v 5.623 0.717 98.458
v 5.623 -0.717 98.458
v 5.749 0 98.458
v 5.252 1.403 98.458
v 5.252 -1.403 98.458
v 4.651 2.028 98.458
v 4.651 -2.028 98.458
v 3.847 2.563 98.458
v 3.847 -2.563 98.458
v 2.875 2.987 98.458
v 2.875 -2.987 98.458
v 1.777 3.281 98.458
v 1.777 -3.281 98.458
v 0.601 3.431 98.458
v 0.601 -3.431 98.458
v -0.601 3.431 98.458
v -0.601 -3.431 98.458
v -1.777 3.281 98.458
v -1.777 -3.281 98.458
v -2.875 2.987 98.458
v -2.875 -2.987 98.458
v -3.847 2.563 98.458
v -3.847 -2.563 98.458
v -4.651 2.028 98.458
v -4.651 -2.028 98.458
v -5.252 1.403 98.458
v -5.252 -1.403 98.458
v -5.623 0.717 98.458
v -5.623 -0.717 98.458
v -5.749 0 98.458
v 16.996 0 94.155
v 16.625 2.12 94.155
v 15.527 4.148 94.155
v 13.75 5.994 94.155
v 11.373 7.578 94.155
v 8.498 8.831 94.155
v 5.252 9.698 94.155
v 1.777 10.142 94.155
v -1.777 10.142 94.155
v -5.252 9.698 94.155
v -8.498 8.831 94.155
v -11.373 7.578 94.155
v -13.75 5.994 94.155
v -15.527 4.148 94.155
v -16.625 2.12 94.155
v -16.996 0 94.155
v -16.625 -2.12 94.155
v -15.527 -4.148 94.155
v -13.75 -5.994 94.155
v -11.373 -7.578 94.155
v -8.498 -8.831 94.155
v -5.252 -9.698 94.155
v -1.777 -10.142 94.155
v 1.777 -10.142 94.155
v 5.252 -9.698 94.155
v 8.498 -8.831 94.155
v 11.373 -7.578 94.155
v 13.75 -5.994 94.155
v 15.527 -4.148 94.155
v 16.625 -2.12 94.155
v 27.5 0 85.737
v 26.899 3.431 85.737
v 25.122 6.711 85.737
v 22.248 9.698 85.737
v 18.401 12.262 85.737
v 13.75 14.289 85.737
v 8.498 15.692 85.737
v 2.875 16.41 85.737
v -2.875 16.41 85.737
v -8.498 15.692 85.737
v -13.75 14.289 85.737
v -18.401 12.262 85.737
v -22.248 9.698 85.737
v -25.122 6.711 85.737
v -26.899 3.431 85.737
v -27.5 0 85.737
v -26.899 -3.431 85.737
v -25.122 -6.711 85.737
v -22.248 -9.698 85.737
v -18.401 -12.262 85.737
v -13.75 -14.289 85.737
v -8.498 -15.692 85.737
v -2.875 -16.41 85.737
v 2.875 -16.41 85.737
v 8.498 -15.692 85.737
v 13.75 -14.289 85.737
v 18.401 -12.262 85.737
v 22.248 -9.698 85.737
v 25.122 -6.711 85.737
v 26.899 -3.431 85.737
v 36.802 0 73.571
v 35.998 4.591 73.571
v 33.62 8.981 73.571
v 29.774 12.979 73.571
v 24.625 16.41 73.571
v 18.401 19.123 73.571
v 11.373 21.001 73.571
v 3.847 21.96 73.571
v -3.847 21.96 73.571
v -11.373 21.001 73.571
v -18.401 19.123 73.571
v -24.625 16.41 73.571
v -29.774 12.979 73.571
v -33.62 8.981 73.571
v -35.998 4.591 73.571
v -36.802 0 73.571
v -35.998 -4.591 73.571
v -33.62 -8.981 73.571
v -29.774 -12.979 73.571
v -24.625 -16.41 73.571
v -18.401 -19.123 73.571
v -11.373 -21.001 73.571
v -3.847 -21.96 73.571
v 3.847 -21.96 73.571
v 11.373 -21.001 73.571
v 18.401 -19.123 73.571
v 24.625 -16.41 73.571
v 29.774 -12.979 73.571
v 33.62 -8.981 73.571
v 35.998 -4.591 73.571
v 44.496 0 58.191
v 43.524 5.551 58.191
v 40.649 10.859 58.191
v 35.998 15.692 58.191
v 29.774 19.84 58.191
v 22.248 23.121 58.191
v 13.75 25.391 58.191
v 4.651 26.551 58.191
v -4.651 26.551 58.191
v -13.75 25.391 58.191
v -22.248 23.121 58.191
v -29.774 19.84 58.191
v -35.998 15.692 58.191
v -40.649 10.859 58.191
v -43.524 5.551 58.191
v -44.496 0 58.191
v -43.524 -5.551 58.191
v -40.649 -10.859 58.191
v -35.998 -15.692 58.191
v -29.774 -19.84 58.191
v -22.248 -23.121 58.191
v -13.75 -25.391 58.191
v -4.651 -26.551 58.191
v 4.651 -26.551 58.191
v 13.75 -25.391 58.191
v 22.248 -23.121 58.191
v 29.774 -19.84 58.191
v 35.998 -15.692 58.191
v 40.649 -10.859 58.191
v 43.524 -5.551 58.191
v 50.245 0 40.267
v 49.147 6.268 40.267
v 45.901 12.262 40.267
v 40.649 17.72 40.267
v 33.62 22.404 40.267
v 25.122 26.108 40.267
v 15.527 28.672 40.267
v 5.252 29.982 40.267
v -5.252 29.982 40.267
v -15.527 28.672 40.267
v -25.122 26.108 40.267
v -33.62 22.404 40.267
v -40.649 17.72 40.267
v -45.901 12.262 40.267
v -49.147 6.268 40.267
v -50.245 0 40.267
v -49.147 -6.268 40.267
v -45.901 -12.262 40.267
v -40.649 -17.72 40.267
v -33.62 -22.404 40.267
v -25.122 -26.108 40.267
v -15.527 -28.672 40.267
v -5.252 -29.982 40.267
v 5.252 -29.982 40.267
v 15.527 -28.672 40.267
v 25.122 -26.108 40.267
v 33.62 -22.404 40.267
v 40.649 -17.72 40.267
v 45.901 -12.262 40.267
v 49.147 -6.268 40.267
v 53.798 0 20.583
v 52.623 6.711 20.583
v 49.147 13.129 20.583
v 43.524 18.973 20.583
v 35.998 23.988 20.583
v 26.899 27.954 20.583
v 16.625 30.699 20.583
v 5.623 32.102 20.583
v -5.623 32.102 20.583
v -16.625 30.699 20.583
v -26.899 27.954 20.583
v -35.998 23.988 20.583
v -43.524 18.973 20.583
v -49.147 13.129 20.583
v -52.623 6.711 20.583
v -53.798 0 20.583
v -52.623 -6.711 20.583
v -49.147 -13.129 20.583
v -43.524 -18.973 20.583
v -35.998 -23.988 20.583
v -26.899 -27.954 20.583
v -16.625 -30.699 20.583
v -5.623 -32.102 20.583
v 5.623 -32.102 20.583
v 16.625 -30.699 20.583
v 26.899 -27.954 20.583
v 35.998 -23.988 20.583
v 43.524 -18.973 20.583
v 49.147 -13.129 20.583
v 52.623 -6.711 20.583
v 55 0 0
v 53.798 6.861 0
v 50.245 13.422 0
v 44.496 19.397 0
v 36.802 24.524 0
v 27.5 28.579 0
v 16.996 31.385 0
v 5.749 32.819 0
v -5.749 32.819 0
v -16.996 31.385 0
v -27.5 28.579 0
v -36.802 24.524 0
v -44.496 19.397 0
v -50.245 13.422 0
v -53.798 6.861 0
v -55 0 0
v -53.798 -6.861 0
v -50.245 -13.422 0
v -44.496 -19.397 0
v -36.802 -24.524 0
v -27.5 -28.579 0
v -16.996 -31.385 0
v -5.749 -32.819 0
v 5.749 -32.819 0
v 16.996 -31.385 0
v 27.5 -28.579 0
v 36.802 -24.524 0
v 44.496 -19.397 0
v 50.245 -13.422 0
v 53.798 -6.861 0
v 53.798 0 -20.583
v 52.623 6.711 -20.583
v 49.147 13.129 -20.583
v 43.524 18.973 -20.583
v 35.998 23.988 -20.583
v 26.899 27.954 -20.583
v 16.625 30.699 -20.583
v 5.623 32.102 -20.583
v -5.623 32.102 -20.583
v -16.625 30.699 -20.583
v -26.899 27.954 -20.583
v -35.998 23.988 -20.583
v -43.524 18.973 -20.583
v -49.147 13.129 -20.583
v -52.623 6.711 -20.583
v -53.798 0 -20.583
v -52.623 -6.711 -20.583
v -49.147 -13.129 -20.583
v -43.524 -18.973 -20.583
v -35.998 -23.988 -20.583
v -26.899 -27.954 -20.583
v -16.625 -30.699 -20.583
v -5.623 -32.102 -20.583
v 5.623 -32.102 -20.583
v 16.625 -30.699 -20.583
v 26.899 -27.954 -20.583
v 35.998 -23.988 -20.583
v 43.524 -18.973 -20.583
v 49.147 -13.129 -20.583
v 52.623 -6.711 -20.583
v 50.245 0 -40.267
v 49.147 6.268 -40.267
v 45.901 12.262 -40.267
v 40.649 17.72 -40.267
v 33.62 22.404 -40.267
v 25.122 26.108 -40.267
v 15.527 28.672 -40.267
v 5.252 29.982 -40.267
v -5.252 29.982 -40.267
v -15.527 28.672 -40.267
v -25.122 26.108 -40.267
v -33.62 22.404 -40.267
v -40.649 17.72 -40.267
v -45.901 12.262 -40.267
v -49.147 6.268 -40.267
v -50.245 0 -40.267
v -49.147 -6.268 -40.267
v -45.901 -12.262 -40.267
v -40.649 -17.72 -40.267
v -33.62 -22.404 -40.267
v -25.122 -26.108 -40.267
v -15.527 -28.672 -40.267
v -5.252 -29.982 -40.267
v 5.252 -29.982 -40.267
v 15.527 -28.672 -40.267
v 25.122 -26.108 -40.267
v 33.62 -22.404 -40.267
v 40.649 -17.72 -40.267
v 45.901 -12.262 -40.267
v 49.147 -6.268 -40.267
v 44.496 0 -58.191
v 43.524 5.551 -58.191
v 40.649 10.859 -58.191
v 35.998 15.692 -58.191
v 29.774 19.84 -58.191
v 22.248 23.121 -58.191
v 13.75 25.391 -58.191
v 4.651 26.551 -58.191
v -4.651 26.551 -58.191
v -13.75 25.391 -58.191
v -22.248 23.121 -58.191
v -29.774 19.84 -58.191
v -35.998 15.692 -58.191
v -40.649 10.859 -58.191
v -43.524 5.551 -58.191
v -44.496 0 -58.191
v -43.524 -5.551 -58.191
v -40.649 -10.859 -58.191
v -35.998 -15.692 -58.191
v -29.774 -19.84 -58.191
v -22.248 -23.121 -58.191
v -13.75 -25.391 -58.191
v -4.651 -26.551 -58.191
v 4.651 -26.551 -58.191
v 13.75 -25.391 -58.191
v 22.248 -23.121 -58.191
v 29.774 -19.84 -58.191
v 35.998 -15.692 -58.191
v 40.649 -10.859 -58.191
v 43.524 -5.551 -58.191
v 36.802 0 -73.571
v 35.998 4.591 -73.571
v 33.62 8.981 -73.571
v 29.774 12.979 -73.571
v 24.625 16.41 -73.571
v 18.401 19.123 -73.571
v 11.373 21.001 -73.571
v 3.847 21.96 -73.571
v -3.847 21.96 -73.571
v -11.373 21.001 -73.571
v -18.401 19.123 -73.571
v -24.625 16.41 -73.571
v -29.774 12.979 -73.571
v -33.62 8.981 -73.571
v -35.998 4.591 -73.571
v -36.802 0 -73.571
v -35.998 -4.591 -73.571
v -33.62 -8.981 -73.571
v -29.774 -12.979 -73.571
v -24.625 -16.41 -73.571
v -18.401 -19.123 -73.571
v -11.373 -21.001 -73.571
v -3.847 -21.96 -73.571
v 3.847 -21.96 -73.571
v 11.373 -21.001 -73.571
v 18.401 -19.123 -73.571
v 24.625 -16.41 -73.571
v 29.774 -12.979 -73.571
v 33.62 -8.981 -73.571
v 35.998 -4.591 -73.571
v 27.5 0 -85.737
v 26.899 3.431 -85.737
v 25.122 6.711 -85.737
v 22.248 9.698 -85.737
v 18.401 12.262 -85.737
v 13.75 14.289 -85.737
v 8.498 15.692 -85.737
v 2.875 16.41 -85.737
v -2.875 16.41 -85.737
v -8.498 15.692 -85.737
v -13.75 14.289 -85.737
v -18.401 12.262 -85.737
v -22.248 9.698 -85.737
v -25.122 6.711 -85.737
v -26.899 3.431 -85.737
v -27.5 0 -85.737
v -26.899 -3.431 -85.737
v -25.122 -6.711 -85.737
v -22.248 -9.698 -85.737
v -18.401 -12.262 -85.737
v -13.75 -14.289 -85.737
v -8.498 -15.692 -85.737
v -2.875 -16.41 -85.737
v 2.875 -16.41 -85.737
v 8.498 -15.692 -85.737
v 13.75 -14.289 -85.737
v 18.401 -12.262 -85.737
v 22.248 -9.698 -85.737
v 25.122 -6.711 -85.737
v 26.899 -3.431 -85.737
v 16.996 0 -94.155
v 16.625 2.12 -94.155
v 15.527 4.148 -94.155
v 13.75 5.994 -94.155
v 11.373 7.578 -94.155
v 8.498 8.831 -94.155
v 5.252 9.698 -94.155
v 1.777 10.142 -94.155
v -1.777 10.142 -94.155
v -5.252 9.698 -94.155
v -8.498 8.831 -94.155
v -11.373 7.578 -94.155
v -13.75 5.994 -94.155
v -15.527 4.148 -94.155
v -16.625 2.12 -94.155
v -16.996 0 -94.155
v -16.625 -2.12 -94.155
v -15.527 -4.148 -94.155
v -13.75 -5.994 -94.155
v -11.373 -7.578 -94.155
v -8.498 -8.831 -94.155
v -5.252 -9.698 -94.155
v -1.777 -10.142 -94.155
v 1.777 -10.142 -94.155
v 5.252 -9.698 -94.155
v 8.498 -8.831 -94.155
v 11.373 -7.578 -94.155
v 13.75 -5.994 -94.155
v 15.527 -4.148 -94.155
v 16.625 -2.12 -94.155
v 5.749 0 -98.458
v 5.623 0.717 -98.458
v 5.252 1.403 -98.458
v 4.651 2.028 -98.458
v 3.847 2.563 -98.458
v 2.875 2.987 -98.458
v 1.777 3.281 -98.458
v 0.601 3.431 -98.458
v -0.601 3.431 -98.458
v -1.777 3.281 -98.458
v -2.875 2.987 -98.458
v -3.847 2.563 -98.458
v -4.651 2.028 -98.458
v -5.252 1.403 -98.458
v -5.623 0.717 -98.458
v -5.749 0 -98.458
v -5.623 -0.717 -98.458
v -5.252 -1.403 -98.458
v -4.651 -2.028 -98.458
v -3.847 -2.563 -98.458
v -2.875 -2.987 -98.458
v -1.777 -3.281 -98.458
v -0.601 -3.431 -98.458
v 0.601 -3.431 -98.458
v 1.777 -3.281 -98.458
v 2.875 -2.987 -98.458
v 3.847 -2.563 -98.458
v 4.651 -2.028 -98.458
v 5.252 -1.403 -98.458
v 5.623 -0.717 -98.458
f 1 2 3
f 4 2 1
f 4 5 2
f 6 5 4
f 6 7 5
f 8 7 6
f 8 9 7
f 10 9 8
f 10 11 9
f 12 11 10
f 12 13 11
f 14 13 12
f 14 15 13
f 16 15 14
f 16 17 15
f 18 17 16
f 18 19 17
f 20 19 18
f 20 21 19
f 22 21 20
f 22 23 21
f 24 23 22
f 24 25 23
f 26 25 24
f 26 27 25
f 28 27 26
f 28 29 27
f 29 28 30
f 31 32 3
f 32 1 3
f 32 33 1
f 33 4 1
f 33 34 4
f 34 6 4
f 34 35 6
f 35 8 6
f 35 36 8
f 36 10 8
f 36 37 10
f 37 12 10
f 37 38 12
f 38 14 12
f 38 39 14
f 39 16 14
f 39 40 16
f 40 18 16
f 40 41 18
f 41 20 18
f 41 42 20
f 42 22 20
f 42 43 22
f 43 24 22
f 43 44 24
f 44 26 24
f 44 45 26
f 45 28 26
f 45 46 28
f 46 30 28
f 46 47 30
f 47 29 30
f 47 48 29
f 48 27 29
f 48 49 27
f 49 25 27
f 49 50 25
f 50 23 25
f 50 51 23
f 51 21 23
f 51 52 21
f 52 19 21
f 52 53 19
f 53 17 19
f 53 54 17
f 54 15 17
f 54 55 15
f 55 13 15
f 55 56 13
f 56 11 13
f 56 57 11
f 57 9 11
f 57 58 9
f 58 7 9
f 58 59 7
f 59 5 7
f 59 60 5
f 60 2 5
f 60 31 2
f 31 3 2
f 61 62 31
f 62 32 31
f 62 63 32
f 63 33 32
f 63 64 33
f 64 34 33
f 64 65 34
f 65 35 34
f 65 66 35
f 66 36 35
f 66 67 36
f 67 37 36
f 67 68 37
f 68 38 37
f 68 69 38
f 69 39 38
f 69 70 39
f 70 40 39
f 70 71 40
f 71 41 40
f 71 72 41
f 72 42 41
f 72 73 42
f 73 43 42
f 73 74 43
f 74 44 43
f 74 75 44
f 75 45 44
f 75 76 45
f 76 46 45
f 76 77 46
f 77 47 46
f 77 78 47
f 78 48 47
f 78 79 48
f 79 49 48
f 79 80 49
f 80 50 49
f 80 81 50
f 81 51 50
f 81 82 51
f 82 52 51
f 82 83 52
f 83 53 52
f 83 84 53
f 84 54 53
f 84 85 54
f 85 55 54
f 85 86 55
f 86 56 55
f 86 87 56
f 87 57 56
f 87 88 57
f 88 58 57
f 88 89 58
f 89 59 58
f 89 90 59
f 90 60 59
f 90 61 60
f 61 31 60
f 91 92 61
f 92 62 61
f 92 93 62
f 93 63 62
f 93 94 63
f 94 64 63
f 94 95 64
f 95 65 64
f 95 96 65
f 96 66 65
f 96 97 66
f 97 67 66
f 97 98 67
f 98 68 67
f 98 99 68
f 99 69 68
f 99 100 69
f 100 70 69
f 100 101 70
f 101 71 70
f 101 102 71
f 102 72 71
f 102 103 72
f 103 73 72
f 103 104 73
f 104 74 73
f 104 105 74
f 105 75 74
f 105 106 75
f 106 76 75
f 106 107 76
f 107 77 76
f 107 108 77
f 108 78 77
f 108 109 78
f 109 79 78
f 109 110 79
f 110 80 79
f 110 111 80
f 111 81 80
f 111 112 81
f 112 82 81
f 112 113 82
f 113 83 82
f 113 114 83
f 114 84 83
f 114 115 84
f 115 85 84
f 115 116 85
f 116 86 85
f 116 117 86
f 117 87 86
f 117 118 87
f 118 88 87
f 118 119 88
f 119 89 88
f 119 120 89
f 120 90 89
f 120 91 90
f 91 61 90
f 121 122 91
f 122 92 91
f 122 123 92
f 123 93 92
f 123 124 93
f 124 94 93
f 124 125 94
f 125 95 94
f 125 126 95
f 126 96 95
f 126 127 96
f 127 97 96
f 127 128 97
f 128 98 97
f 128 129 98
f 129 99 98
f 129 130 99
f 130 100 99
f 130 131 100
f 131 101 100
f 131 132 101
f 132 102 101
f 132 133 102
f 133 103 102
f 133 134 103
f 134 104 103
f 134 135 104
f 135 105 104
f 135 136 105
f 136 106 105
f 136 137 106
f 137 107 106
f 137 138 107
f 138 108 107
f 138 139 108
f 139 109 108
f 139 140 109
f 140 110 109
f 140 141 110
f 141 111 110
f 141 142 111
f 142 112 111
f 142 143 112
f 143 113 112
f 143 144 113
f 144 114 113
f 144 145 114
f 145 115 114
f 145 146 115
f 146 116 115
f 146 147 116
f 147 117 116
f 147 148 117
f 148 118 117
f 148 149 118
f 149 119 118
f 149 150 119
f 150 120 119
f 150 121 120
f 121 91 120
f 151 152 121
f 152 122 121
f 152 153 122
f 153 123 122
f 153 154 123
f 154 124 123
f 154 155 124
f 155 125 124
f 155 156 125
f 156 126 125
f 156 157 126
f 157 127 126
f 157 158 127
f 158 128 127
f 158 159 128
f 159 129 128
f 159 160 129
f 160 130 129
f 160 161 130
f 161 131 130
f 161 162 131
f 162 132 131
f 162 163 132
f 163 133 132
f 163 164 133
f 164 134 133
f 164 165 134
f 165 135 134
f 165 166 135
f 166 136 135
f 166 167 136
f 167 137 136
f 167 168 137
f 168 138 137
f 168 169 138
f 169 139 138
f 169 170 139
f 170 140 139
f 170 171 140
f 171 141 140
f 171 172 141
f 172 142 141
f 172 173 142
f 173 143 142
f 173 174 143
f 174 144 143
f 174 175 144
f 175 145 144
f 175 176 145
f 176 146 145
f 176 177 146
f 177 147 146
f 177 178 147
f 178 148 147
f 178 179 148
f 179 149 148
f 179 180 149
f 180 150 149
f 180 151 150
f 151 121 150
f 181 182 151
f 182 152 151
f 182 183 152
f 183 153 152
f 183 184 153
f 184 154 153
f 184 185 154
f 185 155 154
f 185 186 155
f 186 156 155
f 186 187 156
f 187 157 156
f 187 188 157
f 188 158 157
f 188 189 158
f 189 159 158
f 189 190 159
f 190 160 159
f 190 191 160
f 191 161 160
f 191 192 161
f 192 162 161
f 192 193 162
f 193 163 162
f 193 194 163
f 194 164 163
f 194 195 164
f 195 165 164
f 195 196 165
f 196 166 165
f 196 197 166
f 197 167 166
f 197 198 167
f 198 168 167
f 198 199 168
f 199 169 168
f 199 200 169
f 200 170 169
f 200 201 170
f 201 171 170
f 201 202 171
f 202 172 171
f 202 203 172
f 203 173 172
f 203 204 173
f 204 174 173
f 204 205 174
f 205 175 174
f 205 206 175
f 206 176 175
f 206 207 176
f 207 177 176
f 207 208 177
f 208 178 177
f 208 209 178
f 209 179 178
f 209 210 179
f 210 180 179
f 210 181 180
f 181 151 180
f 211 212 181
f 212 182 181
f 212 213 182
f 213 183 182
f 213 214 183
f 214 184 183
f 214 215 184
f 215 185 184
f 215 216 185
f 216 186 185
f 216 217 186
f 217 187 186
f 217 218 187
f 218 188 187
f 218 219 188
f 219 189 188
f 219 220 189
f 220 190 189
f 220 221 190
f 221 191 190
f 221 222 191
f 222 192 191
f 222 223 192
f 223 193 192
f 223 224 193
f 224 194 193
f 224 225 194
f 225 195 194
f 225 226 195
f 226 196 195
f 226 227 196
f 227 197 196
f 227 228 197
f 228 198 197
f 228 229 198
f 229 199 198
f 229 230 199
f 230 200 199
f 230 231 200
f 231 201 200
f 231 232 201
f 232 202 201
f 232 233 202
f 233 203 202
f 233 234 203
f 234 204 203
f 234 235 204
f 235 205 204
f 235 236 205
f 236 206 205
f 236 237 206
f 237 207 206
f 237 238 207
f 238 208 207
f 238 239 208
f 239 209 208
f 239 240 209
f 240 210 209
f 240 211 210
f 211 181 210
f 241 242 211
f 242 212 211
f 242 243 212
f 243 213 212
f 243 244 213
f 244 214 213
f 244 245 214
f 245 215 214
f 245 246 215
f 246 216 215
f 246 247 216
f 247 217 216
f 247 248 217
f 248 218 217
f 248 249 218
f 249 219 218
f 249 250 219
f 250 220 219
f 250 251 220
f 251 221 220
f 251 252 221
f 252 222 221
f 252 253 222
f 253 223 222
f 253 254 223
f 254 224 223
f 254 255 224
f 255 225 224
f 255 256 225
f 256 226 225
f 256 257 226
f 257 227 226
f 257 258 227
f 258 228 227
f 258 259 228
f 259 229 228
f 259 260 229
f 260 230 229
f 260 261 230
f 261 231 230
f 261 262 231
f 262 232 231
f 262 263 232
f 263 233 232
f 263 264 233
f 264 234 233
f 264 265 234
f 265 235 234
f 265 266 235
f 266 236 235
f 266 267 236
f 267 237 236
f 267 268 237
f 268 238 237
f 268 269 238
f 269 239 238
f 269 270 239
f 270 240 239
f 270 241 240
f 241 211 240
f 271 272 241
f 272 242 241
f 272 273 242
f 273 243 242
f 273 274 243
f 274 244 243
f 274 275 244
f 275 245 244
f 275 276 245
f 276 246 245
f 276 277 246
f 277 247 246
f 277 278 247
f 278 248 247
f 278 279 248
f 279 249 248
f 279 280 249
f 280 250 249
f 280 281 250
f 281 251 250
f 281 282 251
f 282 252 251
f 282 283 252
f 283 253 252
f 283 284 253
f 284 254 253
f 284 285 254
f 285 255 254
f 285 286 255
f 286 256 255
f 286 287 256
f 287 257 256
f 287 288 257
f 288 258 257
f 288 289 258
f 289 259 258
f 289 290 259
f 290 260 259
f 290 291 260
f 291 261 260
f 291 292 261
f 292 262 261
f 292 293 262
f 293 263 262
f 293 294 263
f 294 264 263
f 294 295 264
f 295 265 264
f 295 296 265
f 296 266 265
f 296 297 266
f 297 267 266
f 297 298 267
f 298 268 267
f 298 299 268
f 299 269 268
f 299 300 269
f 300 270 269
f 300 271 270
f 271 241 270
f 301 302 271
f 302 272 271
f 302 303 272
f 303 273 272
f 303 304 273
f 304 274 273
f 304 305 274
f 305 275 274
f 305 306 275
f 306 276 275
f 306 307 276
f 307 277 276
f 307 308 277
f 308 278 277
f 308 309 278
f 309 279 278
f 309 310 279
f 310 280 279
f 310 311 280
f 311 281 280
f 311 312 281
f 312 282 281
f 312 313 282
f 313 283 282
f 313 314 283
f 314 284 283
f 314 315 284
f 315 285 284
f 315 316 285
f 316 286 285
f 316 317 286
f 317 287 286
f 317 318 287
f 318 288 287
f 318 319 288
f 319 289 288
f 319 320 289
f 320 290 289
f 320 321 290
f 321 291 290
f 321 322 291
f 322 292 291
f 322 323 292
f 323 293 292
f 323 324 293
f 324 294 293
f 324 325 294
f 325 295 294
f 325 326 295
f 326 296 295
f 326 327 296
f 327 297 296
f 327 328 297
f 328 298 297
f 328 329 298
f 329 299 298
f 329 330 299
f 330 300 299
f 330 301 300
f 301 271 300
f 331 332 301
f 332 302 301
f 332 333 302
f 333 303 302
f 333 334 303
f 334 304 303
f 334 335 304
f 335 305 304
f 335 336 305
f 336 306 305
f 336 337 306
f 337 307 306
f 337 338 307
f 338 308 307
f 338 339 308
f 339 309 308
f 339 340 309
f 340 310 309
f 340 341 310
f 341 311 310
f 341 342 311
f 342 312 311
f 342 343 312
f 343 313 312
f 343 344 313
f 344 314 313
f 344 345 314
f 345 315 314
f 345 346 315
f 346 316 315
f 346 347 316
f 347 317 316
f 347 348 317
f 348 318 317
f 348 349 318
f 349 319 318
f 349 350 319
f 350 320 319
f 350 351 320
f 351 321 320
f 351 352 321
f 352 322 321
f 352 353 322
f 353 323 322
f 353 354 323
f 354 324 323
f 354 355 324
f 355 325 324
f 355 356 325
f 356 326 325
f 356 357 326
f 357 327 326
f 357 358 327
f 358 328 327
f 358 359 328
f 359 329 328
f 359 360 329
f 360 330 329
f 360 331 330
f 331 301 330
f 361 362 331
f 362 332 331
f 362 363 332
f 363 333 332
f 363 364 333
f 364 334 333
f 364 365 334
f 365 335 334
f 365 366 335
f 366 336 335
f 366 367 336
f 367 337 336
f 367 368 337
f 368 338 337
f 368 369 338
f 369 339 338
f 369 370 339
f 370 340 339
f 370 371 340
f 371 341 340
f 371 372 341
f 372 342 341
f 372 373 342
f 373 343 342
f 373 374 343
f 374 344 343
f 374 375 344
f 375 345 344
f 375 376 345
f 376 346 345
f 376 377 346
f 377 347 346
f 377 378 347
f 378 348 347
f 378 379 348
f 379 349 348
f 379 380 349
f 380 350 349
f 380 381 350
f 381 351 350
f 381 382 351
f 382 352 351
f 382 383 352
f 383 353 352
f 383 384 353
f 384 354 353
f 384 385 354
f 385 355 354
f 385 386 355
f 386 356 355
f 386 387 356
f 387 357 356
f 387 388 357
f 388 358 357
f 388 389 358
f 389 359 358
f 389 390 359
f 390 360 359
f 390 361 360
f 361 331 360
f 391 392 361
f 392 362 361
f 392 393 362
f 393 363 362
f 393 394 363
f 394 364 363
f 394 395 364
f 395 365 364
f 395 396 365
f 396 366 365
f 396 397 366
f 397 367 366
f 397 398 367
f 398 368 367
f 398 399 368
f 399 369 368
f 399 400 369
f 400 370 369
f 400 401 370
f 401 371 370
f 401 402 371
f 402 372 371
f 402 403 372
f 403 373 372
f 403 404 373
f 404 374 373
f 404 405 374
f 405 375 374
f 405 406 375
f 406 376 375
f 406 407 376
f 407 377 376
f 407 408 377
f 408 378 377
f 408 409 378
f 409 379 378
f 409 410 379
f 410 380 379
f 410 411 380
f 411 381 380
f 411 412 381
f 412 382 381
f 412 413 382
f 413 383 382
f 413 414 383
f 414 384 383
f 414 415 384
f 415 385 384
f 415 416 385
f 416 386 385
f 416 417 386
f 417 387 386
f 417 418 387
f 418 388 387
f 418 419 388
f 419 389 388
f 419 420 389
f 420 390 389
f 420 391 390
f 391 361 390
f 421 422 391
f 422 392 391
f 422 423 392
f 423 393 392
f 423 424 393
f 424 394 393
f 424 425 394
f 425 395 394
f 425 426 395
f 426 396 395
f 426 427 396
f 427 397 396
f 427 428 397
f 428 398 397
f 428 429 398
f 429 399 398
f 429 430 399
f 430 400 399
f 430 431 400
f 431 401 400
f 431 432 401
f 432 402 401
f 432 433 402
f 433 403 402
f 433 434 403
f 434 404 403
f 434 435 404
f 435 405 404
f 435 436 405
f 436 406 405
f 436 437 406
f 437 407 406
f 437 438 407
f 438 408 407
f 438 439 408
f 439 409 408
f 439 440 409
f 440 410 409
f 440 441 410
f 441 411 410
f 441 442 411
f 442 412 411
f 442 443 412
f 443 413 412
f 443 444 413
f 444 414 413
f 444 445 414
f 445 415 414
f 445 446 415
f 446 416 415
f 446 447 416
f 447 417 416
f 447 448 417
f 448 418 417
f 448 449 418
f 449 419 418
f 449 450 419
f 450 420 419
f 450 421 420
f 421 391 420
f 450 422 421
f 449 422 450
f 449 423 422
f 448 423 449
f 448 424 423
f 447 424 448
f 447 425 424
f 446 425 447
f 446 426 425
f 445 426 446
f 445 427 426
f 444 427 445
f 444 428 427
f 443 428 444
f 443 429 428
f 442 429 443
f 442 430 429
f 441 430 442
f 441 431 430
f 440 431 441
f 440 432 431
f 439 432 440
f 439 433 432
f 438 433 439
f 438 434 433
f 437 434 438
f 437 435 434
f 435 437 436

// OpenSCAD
// Generated by SolidPython 1.0.1 on 2020-07-29 00:46:46


scale(v = [5, 3, 9]) {
	sphere(r = 11);
}
/***********************************************
*********      SolidPython code:      **********
************************************************
 
# import packages: SolidPython
from solid import *
from solid.utils import *
from itertools import chain, combinations, permutations


class Resize:

    def __init__(self, scad_file):
        self.scad_file = scad_file
        #self.scad_file = import_scad(scad_file)
        # cone/cylinder param:
        self.r1 = 0
        self.r2 = 0
        self.h = 0
        # rectangular prism param:
        self.w = 0
        self.l = 0
        # ellipse param:
        self.r = 0

    # import OpenScad code (file name corresponds to shape)


    # classify shape + parameters
    def assign(self, param1, param2, param3):
        if self.scad_file == 'cone.scad':
            self.r1 = param1
            self.r2 = param2
            self.h = param3
        elif self.scad_file == 'cylinder.scad':
            self.r1 = param1
            self.r2 = param2
            self.h = param3
        elif self.scad_file == 'rectangularPrism.scad':
            self.h = param1
            self.l = param2
            self.w = param3
        else:
            self.r = param1
            self.h = param2

    # resize parameters
    def iterate(self):
        x = range(3, 20, 2)
        i = 1
        if self.scad_file == 'cone.scad':
            tempList = list(permutations(x, 2))
            for temp in tempList:
                param1 = temp[0]
                param2 = temp[1]
                filepath = 'produced_scad_files/' + 'cone' + str(param1) + '_' + str(param2) + '_' + '.scad'
                scad_render_to_file(cylinder(h=param1, r1=param2, r2=0), filepath)

        elif self.scad_file == 'cylinder.scad':
            tempList = list(permutations(x, 3))
            for temp in tempList:
                param1 = temp[0]
                param2 = temp[1]
                filepath = 'produced_scad_files/' + 'cylinder' + str(param1) + '_' + str(param2) + '_' + '.scad'
                scad_render_to_file(cylinder(h=param1, r1=param2, r2=param2), filepath)

        elif self.scad_file == 'rectangularPrism.scad':
            tempList = list(permutations(x, 3))
            for temp in tempList:
                param1 = temp[0]
                param2 = temp[1]
                param3 = temp[2]
                filepath = 'produced_scad_files/' + 'rectangularPrism' + str(param1) + '_' + str(param2) + '_' + str(
                    param3) + '.scad'
                scad_render_to_file(cube(size=(param1, param2, param3)), filepath)

        elif self.scad_file == 'ellipse.scad':
            tempList = list(permutations(x, 4))
            for temp in tempList:
                param1 = temp[0]
                param2 = temp[1]
                param3 = temp[2]
                param4 = temp[3]
                filepath = 'produced_scad_files/' + 'ellipse' + str(param1) + '_' + str(param2) + '_' + str(param3) + '_' + str(param4) + '.scad'
                scad_render_to_file(scale([param1, param2, param3])(sphere(r=param4)), filepath)

    def render_to_scadfile(self):
        scad_render_to_file(scad, 'example.scad') 
 
************************************************/
